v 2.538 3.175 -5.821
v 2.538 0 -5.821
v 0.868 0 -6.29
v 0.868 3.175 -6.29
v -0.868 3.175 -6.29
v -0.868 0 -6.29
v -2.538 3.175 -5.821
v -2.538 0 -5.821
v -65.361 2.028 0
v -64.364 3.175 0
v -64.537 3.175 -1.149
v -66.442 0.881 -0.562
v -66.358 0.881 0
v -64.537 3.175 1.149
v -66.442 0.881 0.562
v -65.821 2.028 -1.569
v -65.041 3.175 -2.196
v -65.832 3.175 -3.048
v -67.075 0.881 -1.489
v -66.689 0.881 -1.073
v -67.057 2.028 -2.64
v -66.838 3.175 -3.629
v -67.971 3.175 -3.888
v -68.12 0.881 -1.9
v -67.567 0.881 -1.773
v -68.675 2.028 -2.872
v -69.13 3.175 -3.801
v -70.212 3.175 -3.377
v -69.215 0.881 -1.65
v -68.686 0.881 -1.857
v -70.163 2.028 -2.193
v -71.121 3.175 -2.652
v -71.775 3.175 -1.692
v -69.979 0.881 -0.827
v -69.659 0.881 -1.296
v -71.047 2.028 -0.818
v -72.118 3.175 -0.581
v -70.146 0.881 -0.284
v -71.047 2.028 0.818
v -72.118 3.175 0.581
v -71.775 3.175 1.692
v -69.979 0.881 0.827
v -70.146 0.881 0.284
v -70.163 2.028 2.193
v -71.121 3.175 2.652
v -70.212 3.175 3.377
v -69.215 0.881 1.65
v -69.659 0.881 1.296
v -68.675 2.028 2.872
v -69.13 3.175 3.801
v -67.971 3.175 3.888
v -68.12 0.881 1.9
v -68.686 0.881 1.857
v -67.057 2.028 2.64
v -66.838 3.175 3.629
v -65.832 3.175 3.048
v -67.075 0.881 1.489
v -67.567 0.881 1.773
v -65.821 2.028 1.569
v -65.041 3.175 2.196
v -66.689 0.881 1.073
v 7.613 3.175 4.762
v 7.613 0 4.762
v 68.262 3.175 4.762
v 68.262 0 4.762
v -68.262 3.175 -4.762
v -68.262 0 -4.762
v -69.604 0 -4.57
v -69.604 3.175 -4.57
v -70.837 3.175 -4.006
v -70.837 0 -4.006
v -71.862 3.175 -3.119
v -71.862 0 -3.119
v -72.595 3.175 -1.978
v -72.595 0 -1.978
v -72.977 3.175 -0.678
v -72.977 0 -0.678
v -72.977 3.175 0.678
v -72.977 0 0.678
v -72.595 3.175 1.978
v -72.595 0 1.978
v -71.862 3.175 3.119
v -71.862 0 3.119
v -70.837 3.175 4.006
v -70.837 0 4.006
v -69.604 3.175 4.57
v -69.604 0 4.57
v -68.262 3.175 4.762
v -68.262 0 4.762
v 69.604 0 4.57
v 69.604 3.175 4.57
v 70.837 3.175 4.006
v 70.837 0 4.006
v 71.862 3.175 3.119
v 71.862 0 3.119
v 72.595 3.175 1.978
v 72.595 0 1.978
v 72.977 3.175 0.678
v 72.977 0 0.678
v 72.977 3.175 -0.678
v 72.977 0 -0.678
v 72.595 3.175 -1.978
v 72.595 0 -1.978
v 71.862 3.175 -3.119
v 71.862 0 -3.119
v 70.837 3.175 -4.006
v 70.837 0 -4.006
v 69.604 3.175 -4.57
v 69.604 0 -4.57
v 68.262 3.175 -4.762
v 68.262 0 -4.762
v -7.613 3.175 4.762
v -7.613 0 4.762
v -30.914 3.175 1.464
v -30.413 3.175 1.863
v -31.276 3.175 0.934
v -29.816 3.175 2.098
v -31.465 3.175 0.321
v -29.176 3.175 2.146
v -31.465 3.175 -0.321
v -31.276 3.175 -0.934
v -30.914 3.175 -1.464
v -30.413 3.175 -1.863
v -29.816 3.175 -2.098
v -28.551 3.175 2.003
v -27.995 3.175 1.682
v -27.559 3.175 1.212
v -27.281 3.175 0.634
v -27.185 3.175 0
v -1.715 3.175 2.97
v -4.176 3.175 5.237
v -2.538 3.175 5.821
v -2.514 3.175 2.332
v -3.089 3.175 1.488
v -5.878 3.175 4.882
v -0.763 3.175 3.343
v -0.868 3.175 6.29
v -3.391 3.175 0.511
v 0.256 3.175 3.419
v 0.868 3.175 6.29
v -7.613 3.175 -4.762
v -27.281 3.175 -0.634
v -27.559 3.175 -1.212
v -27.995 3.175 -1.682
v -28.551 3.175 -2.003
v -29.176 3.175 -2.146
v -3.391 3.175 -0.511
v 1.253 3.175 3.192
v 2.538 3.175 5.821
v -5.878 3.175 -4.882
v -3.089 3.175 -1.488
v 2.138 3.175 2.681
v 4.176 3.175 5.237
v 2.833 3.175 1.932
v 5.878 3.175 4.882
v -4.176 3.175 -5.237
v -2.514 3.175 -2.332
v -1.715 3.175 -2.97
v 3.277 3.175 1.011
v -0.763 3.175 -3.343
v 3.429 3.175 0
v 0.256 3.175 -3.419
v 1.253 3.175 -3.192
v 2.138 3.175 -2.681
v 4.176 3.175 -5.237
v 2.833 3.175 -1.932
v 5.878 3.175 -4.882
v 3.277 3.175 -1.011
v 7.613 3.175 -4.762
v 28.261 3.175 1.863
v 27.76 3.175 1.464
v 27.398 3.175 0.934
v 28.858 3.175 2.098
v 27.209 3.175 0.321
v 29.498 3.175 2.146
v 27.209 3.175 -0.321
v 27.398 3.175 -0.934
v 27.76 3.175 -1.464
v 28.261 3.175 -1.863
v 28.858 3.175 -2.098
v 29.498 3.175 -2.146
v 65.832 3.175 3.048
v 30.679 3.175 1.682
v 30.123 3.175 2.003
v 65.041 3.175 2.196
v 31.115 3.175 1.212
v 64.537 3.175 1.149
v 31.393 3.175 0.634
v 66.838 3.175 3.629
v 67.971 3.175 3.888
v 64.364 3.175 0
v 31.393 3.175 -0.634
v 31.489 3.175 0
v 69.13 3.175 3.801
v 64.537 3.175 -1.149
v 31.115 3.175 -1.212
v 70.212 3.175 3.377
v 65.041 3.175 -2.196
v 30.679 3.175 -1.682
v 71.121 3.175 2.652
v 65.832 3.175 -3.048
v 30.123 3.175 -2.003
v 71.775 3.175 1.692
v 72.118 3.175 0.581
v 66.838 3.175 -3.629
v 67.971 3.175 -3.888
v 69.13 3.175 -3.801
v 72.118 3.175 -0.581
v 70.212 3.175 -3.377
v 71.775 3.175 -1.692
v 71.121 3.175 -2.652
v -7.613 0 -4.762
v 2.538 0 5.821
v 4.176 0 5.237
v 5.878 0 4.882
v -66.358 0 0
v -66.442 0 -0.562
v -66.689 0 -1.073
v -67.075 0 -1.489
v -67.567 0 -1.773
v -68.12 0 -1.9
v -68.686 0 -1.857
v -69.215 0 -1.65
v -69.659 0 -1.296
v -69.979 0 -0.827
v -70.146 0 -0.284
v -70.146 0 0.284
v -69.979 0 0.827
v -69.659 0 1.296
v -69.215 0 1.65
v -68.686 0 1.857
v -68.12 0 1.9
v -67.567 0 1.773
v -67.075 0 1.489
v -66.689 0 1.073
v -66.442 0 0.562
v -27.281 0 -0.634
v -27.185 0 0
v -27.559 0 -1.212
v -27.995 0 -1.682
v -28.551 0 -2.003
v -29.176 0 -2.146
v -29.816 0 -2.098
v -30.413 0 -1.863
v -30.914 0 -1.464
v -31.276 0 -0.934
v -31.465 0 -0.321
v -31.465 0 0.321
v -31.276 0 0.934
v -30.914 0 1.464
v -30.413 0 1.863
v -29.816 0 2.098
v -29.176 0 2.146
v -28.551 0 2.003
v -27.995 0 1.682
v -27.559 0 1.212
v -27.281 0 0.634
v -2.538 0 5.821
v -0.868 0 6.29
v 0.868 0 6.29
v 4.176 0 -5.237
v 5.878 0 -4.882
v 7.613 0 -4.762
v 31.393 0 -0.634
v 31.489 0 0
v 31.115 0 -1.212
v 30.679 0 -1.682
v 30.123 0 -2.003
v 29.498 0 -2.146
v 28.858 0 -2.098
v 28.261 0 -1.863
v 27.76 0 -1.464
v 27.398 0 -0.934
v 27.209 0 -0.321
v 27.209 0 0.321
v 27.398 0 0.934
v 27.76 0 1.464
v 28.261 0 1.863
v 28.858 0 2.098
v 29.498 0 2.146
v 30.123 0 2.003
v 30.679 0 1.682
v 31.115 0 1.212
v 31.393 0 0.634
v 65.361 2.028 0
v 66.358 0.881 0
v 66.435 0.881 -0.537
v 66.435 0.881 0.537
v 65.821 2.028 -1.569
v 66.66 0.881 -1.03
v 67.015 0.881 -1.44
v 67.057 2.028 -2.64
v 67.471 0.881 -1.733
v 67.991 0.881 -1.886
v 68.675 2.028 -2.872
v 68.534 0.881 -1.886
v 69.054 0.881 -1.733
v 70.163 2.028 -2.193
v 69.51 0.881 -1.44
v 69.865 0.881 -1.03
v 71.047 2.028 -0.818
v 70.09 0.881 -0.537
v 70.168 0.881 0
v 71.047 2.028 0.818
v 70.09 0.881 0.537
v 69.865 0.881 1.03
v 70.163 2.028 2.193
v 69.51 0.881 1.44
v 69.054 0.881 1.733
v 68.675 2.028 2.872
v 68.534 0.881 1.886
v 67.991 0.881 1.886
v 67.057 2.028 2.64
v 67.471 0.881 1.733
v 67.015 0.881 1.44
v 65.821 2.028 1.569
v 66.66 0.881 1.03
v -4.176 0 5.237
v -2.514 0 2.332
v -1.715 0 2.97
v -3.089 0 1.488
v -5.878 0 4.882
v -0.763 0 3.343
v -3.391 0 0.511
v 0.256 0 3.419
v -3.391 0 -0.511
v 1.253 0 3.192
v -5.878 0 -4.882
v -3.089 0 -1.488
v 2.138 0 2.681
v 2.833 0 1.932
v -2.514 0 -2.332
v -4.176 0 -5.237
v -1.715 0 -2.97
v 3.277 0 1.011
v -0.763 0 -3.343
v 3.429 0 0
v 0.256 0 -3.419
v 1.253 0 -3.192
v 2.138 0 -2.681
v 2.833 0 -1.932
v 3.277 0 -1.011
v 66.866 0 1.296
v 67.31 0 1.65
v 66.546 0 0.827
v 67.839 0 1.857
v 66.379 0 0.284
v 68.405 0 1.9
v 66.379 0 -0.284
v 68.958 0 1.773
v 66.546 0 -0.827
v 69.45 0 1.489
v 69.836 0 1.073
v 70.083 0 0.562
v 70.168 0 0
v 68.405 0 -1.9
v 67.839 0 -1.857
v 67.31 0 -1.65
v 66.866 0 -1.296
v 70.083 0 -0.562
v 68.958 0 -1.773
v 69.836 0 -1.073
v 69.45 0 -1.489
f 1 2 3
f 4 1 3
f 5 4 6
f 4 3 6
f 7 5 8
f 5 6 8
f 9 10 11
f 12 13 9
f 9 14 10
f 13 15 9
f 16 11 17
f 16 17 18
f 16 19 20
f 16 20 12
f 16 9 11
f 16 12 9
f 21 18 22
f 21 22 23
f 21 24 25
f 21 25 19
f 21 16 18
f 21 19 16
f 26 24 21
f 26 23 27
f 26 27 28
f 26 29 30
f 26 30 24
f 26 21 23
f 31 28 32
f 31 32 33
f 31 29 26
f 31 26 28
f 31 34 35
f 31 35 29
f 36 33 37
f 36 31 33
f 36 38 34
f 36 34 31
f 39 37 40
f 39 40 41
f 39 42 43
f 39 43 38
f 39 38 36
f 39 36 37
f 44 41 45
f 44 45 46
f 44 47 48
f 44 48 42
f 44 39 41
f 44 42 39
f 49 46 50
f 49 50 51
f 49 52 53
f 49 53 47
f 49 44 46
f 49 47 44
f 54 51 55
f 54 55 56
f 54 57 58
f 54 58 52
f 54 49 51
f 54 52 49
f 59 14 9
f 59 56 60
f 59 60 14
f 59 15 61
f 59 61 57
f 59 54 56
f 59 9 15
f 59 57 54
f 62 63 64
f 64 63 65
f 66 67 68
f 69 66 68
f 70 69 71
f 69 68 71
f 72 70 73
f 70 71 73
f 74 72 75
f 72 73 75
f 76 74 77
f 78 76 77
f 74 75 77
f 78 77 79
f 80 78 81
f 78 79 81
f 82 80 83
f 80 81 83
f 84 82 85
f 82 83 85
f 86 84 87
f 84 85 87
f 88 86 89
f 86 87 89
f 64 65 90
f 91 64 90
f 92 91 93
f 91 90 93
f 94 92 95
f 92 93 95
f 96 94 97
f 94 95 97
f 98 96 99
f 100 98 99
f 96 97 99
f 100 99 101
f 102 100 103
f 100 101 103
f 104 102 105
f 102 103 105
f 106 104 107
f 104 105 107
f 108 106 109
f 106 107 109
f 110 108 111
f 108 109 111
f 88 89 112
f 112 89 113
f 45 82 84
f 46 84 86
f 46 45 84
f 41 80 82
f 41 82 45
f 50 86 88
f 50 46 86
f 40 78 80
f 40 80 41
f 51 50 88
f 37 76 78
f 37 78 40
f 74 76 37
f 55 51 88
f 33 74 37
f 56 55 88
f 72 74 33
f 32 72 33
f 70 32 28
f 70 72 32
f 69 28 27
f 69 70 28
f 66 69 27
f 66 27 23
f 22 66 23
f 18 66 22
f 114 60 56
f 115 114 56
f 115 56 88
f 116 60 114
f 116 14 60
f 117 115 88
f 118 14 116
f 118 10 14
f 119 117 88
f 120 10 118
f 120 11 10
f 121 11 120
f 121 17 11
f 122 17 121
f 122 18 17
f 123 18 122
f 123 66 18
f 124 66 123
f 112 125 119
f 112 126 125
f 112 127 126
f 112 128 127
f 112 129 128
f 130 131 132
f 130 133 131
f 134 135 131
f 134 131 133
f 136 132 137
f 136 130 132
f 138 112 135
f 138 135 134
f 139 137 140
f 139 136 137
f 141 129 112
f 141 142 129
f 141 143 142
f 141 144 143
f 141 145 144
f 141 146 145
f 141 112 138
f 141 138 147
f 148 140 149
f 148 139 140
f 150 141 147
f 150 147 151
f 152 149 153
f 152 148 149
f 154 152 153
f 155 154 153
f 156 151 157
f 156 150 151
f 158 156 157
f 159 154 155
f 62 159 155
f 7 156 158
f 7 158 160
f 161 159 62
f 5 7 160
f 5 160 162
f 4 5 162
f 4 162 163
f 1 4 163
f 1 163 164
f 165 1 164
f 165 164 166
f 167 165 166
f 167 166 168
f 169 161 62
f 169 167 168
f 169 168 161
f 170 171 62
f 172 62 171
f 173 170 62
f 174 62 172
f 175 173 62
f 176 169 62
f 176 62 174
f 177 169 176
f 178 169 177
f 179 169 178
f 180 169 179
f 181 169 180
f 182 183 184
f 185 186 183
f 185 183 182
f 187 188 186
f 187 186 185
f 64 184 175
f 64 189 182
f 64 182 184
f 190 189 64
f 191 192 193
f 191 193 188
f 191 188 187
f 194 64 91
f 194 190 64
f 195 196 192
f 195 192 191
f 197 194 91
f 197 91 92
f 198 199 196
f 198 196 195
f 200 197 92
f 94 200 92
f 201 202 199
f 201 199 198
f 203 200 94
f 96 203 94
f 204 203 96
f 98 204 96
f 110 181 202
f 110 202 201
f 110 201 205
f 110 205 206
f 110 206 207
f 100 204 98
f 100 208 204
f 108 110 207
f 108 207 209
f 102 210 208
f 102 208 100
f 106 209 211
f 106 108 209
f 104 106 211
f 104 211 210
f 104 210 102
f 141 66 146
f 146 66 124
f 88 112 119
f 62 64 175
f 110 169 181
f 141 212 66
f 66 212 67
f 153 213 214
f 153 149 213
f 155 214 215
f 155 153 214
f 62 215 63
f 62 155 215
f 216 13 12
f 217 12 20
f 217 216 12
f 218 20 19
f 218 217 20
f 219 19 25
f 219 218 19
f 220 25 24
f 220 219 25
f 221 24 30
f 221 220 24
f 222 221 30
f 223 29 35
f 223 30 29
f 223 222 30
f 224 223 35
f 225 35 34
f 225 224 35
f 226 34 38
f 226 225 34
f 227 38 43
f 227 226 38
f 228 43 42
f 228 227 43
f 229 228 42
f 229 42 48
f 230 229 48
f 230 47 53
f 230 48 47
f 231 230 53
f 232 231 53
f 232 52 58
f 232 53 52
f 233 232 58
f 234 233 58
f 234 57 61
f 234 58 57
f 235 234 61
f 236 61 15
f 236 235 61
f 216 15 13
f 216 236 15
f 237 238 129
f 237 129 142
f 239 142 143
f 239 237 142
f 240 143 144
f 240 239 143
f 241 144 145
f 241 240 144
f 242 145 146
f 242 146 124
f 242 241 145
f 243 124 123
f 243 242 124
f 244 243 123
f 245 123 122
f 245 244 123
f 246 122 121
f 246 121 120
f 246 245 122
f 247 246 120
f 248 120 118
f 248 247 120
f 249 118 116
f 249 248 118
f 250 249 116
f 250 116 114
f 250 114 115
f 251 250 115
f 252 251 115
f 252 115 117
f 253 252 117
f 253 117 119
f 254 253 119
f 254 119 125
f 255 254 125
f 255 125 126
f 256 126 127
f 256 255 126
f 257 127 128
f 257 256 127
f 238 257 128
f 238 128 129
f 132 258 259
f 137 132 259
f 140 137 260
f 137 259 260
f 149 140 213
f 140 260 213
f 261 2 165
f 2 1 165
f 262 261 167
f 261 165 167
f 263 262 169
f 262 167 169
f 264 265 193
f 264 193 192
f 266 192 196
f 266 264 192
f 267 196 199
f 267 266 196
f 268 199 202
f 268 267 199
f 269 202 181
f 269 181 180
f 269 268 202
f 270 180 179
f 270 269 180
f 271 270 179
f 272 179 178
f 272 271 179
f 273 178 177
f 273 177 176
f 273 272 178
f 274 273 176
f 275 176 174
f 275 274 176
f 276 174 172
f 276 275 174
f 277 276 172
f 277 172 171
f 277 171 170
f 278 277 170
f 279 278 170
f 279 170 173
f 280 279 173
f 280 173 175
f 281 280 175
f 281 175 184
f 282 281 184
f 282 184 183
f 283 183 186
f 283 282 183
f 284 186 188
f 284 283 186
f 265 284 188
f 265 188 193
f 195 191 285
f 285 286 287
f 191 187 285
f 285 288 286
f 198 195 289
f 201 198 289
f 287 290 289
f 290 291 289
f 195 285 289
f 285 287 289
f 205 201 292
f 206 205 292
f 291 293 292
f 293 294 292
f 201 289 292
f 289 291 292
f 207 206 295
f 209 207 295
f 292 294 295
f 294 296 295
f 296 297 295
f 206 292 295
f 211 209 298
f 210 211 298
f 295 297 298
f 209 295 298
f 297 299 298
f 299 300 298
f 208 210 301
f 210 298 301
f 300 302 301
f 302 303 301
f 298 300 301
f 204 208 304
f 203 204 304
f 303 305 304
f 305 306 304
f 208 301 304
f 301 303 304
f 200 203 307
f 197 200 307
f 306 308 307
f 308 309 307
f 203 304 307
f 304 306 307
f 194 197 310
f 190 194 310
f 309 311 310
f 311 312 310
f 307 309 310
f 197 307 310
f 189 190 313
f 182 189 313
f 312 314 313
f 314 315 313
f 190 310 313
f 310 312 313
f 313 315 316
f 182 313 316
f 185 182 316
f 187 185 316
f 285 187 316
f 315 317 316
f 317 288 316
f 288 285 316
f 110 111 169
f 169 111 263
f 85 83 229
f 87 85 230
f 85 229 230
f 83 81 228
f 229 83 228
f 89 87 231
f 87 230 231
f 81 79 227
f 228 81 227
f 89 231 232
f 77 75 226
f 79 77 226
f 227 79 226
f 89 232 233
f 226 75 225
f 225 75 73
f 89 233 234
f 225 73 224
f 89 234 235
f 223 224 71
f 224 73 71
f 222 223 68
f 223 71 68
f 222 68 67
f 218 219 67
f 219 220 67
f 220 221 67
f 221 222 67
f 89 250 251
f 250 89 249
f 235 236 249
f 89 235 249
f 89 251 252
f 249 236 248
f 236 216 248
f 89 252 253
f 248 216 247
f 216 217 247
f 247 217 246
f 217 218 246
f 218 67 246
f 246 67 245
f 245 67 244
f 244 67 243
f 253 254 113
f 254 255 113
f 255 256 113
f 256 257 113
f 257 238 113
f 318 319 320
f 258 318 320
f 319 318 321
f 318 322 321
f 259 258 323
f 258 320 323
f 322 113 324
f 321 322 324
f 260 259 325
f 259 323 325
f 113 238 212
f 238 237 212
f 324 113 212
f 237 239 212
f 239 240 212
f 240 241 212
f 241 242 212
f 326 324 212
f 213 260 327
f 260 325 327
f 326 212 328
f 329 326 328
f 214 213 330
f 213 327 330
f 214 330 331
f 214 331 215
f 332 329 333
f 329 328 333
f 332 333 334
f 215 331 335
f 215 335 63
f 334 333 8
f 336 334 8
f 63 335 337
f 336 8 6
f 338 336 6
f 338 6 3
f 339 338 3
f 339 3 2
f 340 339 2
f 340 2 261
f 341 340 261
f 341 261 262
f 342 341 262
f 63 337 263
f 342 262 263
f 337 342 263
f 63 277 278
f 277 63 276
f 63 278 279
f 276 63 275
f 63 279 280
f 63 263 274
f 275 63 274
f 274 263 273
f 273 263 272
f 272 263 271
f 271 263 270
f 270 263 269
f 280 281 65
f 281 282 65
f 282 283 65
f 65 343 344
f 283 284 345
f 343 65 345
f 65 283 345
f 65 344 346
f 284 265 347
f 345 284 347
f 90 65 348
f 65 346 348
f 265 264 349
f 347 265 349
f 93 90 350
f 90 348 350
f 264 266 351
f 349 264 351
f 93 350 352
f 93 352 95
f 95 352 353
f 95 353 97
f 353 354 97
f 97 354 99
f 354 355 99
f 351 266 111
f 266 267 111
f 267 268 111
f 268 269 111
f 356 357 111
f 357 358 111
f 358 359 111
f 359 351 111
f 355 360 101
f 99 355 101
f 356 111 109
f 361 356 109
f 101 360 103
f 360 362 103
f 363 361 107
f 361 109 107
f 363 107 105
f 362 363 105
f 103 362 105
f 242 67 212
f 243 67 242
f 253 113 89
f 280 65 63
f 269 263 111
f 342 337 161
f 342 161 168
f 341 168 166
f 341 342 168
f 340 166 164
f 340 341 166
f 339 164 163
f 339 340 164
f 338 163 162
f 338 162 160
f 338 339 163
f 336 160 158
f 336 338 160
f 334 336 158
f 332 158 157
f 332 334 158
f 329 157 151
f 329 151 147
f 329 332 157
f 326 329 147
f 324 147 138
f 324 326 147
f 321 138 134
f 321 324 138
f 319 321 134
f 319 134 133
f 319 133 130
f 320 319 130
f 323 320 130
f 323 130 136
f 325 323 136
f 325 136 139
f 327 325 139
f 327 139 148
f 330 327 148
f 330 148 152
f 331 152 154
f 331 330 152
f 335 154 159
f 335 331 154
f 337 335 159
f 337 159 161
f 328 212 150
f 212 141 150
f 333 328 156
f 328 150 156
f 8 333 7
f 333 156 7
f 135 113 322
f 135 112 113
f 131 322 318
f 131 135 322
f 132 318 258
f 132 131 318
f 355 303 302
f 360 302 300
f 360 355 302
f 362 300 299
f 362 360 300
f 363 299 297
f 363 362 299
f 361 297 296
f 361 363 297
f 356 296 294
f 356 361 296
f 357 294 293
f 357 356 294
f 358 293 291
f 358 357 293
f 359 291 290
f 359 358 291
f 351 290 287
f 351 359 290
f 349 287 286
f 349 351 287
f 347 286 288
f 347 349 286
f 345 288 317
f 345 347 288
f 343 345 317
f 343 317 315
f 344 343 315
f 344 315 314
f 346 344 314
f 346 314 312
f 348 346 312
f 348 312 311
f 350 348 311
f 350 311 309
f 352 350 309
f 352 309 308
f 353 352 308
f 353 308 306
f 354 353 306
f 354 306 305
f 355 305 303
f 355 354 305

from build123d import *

# Parameters (mm, degrees)
SKETCH1_R           = 1.905
SKETCH1_R_2         = 2.151722897
SKETCH1_R_3         = 3.429
BOSS_EXTRUDE1_DEPTH = 3.175
FILLET1_R           = 12.7


with BuildPart() as part:
    # Sketch1 → Boss-Extrude1 (new body)
    with BuildSketch(Plane(origin=(0, 0, 0), x_dir=(1, 0, 0), z_dir=(0, 1, 0))):
        with BuildLine():
            Line((-4.200130206, 4.7625), (-68.2625, 4.7625))
            ThreePointArc((-68.2625, 4.7625), (-73.025, 0), (-68.2625, -4.7625))
            Line((-68.2625, -4.7625), (-4.200130206, -4.7625))
            ThreePointArc((-4.200130206, -4.7625), (0, -6.35), (4.200130206, -4.7625))
            Line((4.200130206, -4.7625), (68.2625, -4.7625))
            ThreePointArc((68.2625, -4.7625), (73.025, 0), (68.2625, 4.7625))
            Line((68.2625, 4.7625), (4.200130206, 4.7625))
            ThreePointArc((4.200130206, 4.7625), (0, 6.35), (-4.200130206, 4.7625))
        make_face()
        with Locations((-68.2625, 0)):
            Circle(SKETCH1_R, mode=Mode.SUBTRACT)
        with Locations((-29.337, 0)):
            Circle(SKETCH1_R_2, mode=Mode.SUBTRACT)
        Circle(SKETCH1_R_3, mode=Mode.SUBTRACT)
        with Locations((68.2625, 0)):
            Circle(SKETCH1_R, mode=Mode.SUBTRACT)
        with Locations((29.337, 0)):
            Circle(SKETCH1_R_2, mode=Mode.SUBTRACT)
    extrude(amount=BOSS_EXTRUDE1_DEPTH)

    # Fillet1
    fillet1_edges = [part.edges().sort_by_distance(p)[0] for p in [
        (-4.200130206, 1.5875, -4.7625),
        (4.200130206, 1.5875, -4.7625),
        (4.200130206, 1.5875, 4.7625),
        (-4.200130206, 1.5875, 4.7625),
    ]]
    fillet(fillet1_edges, radius=FILLET1_R)

    # Sketch5 → Cut-Revolve2 (revolve, cut)
    with BuildSketch(Plane.XY):
        Polygon((-64.3636, 3.175), (-66.505348665, 0.7112), (-66.505348665, 3.175), align=None)
    cut_revolve2 = revolve(axis=Axis((-68.2625, 0, 0), (0, 1, 0)), mode=Mode.SUBTRACT)

    # Mirror1: Cut-Revolve2 across plane
    add(cut_revolve2.mirror(Plane(origin=(0, 0, 0), x_dir=(0, 0, 1), z_dir=(1, 0, 0))), mode=Mode.SUBTRACT)


solid = part.part
